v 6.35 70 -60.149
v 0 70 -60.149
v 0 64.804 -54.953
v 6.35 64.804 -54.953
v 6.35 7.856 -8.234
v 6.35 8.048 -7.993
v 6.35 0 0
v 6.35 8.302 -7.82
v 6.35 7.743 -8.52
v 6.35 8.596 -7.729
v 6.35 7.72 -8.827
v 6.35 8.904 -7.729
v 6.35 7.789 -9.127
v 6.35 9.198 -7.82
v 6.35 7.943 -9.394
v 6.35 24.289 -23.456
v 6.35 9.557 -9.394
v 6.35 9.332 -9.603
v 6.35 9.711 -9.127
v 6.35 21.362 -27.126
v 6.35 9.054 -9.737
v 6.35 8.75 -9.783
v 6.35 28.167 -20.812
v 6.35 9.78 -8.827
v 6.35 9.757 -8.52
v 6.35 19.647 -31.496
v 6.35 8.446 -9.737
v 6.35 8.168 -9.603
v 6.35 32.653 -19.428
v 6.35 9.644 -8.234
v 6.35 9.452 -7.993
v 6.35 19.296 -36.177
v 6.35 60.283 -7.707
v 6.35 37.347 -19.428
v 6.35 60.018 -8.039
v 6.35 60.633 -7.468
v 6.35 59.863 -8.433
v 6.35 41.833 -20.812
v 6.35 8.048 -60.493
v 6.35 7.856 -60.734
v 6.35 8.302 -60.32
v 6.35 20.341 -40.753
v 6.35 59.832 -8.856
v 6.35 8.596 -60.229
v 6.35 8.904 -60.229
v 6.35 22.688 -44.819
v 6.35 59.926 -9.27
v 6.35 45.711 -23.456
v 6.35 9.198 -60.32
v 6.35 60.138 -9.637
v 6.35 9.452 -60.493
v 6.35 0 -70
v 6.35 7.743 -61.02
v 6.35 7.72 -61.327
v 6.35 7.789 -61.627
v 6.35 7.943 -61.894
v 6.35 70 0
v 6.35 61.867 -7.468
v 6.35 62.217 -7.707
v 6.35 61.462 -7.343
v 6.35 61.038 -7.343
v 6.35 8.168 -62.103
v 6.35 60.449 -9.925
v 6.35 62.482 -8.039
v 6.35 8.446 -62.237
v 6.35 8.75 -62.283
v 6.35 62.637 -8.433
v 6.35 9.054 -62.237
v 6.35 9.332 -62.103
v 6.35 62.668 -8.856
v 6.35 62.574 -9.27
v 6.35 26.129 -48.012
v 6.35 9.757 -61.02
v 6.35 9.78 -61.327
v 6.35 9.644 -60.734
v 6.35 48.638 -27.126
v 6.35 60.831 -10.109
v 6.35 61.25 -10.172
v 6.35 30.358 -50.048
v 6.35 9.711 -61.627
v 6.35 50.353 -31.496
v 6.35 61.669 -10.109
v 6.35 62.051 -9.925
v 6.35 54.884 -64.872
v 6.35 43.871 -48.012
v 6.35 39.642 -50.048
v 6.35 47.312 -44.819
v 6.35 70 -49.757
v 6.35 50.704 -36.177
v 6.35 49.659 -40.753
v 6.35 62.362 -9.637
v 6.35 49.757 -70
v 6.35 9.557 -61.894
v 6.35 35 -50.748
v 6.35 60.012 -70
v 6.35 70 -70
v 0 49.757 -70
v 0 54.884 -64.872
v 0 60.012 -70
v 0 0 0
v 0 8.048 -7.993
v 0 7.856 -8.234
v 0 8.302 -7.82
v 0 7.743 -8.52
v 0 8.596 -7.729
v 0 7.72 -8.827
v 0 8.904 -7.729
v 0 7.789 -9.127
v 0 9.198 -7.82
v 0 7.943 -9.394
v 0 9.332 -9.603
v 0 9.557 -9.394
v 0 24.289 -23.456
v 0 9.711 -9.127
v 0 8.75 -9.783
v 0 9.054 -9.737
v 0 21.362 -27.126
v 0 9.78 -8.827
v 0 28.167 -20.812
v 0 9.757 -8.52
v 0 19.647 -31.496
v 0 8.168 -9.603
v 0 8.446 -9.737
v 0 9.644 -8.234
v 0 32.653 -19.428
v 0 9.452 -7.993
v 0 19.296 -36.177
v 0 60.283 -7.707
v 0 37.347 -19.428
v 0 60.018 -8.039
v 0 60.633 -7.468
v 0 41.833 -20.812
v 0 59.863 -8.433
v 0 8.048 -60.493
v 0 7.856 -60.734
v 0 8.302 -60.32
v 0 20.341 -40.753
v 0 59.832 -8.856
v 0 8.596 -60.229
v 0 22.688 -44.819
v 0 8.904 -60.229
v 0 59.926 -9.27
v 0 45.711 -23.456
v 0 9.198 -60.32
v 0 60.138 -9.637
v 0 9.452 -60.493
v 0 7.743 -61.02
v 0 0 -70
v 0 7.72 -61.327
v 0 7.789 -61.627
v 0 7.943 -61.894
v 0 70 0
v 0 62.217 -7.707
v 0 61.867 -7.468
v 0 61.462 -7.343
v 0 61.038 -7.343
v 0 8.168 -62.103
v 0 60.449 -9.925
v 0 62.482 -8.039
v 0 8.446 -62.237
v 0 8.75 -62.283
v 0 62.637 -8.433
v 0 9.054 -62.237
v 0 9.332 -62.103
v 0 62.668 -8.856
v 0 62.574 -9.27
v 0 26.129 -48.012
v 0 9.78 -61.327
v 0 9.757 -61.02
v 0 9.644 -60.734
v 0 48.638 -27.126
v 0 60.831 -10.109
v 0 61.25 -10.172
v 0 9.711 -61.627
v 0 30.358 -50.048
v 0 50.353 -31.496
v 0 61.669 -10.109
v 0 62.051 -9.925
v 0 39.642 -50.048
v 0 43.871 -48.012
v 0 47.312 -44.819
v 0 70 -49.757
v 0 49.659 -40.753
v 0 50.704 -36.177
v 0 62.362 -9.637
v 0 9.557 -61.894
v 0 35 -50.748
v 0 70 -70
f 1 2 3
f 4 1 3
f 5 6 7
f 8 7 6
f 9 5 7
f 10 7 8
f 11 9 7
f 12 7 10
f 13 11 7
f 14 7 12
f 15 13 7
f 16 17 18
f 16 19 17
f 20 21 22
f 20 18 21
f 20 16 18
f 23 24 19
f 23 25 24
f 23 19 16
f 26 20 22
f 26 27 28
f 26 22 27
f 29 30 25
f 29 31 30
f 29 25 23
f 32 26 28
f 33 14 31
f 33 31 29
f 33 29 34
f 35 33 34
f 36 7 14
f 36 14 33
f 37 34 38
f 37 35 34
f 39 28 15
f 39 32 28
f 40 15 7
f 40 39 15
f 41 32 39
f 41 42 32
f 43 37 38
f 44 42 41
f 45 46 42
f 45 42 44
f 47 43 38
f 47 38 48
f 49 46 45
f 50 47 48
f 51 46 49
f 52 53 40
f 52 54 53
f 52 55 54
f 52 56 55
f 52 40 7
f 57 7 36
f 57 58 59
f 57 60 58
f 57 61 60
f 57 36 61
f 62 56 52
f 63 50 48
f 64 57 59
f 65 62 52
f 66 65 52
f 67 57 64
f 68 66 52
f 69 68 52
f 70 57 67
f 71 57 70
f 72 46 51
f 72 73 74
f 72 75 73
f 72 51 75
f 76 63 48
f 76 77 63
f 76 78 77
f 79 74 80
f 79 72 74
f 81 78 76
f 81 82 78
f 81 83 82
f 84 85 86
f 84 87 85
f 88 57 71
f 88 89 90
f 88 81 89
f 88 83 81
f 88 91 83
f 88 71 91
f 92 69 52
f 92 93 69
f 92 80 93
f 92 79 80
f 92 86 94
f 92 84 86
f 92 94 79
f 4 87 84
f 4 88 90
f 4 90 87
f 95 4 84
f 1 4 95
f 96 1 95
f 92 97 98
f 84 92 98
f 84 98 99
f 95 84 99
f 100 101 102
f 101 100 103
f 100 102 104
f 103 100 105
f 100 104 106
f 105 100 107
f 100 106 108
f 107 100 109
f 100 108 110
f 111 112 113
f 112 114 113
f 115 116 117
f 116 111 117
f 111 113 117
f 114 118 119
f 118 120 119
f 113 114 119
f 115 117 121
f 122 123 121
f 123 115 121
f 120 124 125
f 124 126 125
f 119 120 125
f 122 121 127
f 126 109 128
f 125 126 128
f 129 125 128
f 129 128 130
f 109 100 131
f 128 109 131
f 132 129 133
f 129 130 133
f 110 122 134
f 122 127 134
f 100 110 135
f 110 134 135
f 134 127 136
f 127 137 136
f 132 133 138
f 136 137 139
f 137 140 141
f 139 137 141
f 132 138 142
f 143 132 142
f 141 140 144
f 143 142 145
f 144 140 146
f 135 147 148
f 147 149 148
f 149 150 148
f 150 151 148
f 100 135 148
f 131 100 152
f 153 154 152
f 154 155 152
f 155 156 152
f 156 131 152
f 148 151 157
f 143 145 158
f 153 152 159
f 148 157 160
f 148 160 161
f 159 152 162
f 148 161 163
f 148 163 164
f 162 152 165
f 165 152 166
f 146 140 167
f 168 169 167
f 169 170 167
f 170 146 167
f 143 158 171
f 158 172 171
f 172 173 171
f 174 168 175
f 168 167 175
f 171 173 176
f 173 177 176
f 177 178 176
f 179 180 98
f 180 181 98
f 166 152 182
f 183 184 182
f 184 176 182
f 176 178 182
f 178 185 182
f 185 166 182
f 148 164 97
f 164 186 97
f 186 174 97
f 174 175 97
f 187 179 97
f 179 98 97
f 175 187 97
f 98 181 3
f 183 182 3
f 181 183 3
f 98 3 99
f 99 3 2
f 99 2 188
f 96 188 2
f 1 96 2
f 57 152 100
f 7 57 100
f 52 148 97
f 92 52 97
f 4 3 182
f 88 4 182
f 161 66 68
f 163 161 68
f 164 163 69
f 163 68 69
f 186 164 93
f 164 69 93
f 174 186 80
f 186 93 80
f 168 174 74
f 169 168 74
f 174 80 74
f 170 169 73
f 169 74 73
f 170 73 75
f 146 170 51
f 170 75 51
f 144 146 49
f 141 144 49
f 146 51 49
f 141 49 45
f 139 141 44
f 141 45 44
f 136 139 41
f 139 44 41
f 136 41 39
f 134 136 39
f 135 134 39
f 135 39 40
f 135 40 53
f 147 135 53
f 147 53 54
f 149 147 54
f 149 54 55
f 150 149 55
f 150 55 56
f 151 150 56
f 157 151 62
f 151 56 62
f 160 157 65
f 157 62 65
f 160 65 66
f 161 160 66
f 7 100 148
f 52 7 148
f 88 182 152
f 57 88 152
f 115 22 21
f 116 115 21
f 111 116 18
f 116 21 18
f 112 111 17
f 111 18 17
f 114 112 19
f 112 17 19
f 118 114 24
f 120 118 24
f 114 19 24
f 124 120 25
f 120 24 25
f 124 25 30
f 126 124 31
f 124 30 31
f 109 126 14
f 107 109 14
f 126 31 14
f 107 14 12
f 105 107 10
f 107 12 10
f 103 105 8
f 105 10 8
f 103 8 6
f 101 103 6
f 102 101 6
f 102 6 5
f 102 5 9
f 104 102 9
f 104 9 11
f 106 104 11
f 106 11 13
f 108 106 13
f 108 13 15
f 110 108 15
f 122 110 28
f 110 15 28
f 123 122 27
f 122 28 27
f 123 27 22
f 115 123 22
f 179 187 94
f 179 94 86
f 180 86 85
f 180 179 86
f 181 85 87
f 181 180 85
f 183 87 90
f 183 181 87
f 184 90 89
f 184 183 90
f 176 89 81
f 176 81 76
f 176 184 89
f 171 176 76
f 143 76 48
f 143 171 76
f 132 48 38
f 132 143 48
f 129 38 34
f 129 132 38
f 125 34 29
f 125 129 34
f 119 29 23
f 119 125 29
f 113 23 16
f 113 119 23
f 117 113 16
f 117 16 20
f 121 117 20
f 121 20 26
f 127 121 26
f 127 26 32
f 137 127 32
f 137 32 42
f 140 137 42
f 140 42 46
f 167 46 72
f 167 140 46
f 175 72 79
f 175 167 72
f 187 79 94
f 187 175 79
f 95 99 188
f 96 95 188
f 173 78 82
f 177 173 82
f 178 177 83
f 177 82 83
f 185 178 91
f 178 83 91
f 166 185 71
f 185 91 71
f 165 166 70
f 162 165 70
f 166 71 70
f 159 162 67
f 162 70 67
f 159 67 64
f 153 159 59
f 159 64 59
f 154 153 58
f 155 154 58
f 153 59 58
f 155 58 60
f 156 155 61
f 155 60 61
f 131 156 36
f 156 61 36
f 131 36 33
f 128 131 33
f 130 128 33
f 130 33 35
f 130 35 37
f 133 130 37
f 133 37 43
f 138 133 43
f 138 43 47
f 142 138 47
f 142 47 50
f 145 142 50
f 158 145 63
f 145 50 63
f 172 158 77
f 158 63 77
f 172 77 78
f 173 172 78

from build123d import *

# Parameters (mm, degrees)
SKETCH1_R           = 15.748
BOSS_EXTRUDE1_DEPTH = 6.35
SKETCH2_R           = 1.4224
SKETCH2_R_2         = 1.03251
CUT_EXTRUDE1_DEPTH  = 6.35


with BuildPart() as part:
    # Sketch1 → Boss-Extrude1 (new body)
    with BuildSketch(Plane(origin=(0, 0, 0), x_dir=(0, 0, -1), z_dir=(1, 0, 0))):
        Polygon((0, 0), (70, 0), (70, 49.756615014), (64.872483647, 54.884131367), (70, 60.011647719), (70, 70), (60.148635267, 70), (54.952625141, 64.803989874), (49.756615014, 70), (0, 70), align=None)
        with Locations((35, 35)):
            Circle(SKETCH1_R, mode=Mode.SUBTRACT)
    extrude(amount=BOSS_EXTRUDE1_DEPTH)

    # Sketch2 → Cut-Extrude1 (cut)
    with BuildSketch(Plane(origin=(6.35, 0, 0), x_dir=(0, 0, -1), z_dir=(1, 0, 0))):
        with Locations((8.75, 61.25)):
            Circle(SKETCH2_R)
        with Locations((8.75, 8.75)):
            Circle(SKETCH2_R_2)
        with Locations((61.25, 8.75)):
            Circle(SKETCH2_R_2)
    extrude(amount=-CUT_EXTRUDE1_DEPTH, mode=Mode.SUBTRACT)


solid = part.part
